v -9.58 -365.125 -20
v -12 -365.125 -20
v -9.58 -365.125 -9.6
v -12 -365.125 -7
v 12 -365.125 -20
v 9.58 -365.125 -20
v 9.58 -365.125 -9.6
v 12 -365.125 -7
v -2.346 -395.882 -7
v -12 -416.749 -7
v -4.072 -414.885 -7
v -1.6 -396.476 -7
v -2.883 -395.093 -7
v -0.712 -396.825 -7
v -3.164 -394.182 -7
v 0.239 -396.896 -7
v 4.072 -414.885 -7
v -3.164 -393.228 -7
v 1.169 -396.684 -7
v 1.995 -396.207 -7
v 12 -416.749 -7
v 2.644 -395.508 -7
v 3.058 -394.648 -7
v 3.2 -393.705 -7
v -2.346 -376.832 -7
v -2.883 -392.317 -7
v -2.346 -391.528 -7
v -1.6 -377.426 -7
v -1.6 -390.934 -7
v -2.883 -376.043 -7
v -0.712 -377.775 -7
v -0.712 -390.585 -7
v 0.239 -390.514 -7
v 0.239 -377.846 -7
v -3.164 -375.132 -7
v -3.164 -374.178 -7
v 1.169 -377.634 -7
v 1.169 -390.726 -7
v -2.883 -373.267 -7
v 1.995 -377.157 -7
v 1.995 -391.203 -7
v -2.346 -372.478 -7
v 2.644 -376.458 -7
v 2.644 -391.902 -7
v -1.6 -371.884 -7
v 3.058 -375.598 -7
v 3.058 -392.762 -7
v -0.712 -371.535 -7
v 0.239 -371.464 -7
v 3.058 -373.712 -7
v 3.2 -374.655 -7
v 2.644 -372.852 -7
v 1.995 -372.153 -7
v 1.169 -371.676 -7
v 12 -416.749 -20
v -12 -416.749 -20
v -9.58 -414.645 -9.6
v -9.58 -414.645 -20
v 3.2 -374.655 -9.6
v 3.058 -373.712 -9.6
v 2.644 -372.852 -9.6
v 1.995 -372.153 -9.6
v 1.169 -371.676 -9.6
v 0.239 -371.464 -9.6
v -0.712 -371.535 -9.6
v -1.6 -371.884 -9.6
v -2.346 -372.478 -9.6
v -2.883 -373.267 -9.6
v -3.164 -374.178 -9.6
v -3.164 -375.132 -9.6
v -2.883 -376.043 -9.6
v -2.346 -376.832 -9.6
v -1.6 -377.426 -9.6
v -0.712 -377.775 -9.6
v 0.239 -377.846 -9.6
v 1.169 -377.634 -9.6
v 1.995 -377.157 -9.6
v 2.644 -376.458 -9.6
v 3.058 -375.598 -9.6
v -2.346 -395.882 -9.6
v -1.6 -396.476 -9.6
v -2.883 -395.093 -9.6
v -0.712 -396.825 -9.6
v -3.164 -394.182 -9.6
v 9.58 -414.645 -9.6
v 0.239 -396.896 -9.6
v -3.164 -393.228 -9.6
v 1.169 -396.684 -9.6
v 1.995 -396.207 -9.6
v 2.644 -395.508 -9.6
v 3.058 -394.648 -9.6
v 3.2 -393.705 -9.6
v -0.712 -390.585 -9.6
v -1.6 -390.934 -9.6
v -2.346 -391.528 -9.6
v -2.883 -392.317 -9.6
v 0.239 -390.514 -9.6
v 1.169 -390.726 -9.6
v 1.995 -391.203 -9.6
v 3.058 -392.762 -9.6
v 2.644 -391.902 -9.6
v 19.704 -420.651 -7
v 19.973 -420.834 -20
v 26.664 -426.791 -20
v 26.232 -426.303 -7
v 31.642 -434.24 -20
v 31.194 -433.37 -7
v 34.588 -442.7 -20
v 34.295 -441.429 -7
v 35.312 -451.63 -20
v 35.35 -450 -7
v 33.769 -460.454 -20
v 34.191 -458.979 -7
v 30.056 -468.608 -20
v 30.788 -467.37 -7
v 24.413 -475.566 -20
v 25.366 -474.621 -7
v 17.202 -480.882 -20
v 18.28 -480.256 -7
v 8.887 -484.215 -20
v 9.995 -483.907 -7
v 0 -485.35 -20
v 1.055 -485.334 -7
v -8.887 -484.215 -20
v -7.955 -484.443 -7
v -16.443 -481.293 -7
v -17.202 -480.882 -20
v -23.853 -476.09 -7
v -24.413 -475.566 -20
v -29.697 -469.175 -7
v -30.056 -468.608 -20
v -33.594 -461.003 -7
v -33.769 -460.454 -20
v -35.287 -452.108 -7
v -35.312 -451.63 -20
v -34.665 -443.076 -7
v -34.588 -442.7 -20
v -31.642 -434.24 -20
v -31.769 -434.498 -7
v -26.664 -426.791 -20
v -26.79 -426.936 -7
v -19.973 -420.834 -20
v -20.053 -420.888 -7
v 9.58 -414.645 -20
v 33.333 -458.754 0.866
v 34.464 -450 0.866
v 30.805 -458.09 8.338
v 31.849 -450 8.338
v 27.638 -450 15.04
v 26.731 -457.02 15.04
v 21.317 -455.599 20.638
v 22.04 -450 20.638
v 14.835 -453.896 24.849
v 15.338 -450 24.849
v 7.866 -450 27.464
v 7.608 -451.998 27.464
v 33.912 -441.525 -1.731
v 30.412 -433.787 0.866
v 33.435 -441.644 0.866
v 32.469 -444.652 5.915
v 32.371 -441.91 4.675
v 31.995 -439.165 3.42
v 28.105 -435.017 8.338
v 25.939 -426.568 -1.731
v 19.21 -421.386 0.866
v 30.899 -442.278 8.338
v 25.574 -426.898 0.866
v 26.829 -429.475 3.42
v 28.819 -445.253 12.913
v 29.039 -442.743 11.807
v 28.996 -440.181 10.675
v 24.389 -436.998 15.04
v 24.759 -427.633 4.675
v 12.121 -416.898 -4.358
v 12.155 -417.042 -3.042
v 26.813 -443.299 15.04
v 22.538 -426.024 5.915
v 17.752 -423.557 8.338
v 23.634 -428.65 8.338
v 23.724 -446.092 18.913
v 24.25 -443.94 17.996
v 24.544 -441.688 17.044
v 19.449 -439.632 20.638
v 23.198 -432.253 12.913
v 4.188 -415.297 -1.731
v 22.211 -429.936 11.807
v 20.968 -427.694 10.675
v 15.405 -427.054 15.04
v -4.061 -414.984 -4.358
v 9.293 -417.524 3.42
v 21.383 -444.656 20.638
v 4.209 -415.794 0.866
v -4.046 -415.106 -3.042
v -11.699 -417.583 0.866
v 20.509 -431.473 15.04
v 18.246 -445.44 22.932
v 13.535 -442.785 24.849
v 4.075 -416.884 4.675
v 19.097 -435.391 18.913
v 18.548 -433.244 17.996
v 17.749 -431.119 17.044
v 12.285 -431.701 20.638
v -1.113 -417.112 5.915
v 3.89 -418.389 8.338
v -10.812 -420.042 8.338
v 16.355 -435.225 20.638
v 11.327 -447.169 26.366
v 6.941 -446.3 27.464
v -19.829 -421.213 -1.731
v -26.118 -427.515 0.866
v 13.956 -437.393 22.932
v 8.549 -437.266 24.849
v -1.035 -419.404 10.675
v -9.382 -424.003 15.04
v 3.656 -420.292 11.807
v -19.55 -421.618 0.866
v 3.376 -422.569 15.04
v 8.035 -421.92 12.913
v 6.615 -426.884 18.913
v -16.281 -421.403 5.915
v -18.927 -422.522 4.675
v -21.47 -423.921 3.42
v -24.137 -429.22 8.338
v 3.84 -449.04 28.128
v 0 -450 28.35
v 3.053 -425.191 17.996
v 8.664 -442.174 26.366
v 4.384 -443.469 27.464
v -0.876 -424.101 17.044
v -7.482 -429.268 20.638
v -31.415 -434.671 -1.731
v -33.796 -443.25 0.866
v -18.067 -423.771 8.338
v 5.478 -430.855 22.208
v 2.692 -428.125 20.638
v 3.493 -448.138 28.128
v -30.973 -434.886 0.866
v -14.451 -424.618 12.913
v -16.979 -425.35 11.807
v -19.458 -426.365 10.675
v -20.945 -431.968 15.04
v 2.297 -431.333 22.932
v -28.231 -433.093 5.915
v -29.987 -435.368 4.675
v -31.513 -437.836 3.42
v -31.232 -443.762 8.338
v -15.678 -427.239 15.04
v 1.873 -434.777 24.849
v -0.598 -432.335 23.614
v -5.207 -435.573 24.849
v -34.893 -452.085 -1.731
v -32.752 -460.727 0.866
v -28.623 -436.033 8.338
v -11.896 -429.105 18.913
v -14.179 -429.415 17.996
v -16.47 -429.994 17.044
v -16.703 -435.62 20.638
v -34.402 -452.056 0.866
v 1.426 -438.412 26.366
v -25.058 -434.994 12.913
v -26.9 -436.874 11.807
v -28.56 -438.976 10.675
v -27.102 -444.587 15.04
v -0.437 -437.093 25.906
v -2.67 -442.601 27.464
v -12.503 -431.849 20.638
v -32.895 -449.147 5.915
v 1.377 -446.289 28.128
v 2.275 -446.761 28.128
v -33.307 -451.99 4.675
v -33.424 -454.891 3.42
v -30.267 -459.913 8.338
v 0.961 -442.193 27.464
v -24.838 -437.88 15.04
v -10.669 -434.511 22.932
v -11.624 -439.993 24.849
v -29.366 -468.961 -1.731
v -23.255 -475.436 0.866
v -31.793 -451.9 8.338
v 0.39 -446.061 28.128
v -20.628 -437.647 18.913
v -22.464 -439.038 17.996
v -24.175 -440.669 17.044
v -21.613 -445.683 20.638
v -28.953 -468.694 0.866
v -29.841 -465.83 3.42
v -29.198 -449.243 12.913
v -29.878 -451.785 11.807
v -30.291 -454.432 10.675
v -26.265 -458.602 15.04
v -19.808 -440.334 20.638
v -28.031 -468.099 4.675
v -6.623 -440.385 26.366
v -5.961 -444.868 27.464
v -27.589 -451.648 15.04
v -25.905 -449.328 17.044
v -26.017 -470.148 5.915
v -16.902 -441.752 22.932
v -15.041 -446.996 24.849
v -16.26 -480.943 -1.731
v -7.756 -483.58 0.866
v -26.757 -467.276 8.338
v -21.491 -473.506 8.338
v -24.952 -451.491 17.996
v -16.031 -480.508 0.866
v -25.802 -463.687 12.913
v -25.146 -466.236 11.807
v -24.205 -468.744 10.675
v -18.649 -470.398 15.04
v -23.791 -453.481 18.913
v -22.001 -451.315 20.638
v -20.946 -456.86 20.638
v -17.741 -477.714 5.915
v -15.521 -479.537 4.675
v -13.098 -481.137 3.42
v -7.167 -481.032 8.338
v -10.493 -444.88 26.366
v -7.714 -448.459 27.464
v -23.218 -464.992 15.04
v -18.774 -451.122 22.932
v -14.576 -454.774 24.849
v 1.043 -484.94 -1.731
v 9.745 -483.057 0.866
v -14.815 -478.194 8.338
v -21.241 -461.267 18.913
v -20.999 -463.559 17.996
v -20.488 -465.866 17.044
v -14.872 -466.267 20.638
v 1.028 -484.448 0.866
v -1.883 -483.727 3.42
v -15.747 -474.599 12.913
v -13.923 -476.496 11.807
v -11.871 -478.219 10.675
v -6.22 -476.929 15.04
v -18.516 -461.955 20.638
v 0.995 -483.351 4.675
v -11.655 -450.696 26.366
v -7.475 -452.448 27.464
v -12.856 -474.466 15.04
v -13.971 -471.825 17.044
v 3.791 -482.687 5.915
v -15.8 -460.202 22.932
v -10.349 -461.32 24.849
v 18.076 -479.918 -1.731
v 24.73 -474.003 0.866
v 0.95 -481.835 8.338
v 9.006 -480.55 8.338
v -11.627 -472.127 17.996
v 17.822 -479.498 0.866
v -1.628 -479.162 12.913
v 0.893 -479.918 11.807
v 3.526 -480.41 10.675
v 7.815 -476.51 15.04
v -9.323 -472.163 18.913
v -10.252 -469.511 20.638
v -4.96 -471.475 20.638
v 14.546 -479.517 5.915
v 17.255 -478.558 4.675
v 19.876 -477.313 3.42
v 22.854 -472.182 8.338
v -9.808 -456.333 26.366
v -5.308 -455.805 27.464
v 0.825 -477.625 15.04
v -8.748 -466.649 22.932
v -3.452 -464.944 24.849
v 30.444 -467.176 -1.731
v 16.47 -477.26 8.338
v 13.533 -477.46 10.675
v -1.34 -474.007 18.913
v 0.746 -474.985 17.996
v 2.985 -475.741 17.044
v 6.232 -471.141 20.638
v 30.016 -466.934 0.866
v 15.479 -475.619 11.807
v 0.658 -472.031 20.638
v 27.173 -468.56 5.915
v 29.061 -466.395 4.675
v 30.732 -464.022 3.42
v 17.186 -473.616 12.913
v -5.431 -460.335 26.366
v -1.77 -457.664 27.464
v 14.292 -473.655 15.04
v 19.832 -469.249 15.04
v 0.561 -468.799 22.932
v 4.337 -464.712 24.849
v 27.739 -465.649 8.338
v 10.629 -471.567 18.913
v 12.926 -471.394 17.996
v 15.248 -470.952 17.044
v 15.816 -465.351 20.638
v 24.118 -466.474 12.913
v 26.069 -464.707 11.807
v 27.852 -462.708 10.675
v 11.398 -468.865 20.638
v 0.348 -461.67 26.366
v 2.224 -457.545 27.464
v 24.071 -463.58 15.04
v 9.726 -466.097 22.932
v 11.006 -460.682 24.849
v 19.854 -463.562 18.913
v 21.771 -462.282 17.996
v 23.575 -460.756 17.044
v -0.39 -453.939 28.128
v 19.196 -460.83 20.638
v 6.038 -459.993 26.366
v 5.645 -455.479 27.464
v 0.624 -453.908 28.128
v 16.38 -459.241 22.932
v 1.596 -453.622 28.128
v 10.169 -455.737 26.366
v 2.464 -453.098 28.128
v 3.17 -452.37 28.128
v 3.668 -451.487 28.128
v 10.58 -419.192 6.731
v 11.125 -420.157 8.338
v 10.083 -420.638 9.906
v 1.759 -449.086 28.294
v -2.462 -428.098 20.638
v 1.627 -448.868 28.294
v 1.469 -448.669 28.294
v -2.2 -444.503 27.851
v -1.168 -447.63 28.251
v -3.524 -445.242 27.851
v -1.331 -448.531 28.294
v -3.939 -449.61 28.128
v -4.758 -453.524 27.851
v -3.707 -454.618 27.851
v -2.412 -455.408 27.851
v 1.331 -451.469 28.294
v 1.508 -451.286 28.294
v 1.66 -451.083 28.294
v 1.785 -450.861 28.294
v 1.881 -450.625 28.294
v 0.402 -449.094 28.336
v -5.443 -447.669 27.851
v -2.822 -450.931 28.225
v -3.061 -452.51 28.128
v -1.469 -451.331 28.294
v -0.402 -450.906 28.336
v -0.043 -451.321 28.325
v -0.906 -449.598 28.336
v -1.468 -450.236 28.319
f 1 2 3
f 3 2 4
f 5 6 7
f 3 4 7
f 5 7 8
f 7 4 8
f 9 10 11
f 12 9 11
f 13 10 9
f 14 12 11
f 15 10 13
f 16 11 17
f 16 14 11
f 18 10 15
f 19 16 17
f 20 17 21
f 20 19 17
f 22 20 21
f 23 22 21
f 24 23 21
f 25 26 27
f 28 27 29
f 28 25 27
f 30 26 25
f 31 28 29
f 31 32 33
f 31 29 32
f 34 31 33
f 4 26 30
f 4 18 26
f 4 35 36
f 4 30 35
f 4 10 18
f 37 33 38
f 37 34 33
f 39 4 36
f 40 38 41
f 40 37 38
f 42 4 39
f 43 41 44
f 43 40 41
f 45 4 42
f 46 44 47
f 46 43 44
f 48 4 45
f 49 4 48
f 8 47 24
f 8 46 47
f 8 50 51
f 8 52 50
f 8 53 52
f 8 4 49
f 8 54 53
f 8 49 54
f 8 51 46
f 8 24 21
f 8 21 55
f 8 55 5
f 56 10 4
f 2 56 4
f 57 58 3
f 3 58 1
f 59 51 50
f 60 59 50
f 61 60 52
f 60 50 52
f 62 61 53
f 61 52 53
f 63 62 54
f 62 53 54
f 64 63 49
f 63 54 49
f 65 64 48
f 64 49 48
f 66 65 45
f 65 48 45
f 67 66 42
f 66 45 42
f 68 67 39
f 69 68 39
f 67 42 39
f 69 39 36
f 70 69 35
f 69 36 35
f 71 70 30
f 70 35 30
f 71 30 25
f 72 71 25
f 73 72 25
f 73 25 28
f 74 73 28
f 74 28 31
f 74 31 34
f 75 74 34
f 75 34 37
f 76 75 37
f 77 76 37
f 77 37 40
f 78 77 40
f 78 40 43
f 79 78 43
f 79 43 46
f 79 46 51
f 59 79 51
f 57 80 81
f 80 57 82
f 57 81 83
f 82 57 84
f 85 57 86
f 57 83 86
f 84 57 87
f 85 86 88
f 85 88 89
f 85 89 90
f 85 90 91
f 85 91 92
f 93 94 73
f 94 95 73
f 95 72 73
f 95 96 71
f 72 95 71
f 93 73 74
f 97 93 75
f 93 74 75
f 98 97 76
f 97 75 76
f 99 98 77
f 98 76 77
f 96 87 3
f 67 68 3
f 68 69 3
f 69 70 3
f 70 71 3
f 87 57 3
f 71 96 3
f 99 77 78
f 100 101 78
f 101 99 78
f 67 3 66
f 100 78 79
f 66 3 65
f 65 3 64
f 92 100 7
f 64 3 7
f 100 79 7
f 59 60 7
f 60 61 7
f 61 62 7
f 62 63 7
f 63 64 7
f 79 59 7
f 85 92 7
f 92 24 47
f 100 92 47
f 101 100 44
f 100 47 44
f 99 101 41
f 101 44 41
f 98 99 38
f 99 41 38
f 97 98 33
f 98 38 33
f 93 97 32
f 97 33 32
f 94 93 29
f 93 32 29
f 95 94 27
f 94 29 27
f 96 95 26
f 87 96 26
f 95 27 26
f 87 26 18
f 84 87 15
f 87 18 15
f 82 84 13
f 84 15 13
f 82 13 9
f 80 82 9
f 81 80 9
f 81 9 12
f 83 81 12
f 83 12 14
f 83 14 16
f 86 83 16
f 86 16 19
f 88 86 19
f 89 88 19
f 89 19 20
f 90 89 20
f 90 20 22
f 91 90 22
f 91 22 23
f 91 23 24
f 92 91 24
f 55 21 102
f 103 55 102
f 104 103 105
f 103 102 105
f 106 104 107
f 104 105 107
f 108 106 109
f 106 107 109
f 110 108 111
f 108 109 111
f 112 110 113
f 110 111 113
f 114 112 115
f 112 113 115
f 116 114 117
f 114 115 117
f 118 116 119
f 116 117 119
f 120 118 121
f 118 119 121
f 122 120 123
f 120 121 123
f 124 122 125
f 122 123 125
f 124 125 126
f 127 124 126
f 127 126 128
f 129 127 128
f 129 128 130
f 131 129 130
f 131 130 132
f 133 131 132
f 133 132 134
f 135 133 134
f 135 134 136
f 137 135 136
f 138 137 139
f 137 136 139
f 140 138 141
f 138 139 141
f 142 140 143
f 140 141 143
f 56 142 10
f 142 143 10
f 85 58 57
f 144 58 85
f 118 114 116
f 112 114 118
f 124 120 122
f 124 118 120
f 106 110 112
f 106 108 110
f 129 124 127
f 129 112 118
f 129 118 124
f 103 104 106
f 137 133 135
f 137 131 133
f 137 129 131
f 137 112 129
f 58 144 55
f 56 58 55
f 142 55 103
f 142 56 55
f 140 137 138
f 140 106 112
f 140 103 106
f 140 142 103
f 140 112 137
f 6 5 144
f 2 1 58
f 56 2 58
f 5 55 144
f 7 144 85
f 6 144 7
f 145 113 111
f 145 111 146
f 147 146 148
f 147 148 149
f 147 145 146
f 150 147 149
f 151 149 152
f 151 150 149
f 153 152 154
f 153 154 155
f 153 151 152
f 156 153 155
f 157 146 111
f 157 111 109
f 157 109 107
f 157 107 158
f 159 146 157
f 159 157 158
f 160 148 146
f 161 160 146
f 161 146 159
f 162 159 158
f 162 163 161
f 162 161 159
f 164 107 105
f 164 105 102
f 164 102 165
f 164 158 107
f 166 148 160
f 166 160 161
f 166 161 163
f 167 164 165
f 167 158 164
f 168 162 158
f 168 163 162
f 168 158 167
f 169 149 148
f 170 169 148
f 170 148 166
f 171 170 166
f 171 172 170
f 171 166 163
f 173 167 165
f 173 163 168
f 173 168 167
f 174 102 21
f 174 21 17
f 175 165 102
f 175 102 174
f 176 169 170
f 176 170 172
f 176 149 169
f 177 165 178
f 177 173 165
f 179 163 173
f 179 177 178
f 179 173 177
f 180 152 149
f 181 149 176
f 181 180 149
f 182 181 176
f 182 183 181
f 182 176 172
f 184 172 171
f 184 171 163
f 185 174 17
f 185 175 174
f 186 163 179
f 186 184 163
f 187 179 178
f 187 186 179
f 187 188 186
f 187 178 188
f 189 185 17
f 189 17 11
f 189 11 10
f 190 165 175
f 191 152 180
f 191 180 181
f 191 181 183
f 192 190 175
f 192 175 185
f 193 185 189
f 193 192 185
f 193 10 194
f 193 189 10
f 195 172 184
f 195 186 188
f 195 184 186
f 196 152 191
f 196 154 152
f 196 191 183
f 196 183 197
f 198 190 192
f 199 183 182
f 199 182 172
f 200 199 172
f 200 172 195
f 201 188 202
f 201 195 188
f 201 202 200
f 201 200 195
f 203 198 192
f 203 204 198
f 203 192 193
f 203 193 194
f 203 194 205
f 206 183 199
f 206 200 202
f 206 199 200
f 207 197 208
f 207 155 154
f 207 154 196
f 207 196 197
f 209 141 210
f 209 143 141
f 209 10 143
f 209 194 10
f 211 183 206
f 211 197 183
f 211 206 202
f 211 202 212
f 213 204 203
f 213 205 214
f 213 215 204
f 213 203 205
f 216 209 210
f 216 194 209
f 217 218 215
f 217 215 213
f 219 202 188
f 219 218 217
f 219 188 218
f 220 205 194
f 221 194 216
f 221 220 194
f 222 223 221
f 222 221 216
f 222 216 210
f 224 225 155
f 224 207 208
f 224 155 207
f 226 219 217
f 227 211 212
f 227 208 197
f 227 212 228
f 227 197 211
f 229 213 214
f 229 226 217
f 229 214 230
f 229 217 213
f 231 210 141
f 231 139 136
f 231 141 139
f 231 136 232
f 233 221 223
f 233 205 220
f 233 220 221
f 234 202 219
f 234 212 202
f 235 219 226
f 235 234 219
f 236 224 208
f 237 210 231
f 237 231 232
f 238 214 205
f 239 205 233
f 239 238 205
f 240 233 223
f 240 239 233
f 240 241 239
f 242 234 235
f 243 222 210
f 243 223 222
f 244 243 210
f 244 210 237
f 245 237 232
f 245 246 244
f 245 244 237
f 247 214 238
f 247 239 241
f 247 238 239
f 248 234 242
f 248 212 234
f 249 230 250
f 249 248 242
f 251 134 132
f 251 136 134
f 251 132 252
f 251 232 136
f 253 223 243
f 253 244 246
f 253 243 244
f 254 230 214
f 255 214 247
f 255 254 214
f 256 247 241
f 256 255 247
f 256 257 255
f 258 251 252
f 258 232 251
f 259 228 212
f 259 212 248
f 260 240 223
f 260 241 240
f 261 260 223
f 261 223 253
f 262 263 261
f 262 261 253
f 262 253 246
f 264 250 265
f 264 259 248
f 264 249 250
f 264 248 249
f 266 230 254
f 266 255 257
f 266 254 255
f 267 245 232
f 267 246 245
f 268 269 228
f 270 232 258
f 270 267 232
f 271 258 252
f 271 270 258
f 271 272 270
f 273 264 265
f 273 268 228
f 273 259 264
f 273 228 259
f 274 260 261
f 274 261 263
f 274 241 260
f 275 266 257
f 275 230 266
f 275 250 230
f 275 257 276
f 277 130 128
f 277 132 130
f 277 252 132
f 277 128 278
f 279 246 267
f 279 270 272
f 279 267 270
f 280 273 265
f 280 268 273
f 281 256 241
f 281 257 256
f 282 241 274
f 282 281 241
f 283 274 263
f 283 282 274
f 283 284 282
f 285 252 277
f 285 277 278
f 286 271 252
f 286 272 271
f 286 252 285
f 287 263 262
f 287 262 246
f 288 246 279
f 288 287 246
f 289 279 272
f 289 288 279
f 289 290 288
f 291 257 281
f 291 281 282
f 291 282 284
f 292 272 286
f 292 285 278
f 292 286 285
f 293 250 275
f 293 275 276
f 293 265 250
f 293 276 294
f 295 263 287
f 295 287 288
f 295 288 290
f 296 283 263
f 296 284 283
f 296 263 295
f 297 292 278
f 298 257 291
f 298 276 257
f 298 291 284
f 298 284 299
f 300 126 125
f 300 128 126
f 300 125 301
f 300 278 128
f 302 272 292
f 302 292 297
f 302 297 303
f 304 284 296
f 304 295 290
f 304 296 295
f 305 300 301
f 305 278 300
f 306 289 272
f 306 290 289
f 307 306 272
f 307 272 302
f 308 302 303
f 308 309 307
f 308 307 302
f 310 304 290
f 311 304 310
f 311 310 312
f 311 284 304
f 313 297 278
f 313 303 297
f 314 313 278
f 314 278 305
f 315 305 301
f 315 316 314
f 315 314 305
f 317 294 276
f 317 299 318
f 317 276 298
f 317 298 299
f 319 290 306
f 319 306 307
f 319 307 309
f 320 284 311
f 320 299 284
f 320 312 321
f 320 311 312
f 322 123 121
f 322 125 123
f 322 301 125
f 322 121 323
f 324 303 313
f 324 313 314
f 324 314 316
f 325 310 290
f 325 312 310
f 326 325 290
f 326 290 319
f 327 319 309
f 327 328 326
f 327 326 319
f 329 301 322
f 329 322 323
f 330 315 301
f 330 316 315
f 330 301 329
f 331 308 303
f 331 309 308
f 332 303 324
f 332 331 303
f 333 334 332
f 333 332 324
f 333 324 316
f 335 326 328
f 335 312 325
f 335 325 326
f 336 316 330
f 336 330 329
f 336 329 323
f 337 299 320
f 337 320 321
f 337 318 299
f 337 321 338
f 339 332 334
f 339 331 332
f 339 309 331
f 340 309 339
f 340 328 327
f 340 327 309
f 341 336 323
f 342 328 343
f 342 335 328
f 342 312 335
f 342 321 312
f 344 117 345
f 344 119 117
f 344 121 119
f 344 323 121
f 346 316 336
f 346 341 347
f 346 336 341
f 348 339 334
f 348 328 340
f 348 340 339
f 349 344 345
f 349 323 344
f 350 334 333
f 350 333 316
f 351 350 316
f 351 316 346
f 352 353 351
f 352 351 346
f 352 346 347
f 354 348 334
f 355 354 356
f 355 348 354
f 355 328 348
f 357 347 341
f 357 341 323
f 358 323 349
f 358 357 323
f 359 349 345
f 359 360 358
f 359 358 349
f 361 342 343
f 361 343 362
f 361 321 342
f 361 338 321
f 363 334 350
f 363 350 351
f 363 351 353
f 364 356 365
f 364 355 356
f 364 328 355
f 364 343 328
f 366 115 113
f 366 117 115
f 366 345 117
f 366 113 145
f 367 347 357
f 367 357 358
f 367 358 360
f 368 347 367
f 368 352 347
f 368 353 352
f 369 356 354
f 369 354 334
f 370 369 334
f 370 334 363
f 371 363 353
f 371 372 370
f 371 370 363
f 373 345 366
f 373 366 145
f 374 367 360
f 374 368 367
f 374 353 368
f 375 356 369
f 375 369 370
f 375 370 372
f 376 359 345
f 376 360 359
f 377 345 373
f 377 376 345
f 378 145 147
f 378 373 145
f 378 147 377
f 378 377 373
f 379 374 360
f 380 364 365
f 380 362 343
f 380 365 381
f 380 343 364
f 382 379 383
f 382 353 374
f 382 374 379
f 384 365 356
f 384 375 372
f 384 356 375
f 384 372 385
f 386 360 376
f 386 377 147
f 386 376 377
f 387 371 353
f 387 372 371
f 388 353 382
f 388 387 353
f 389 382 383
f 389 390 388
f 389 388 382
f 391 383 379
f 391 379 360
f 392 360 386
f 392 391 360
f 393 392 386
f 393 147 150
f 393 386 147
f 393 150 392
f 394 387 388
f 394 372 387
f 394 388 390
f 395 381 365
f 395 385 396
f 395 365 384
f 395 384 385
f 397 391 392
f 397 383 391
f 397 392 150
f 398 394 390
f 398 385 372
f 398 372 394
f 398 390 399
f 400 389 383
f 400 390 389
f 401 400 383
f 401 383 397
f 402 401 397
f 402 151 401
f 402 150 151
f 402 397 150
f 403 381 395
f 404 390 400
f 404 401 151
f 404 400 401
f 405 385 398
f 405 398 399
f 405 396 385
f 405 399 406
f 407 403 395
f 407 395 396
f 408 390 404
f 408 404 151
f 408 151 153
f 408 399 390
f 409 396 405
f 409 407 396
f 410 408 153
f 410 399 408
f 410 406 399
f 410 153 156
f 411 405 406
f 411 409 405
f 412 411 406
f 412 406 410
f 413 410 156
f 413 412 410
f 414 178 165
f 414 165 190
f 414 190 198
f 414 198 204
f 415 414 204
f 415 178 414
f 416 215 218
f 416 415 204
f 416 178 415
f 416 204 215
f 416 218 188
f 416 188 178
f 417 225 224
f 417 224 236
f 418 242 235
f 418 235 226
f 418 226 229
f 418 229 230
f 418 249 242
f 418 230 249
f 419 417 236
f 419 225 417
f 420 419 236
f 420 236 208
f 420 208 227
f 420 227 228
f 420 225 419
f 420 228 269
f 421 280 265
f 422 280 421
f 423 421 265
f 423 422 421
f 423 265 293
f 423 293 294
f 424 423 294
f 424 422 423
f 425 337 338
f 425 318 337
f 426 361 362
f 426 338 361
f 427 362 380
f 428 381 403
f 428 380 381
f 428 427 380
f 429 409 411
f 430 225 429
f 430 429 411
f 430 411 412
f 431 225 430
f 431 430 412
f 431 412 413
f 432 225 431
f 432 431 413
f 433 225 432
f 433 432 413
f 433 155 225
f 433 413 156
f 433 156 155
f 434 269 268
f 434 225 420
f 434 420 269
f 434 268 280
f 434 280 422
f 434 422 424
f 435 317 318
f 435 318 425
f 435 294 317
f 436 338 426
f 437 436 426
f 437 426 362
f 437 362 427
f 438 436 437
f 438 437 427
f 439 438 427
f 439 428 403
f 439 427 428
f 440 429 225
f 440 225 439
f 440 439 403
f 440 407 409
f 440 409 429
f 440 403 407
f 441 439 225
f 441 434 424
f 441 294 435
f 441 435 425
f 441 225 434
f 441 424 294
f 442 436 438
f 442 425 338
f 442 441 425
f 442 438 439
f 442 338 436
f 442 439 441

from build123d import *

# Parameters (mm, degrees)
SKETCH001_W       = 19.16
SKETCH001_H       = 49.52
EXTRUDE001_DEPTH  = 10.4
SKETCH138_W       = 24
SKETCH138_H       = 84.875
SKETCH138_R       = 3.2
EXTRUDE042_DEPTH  = 13
CYLINDER168_R     = 35.35
CYLINDER168_DEPTH = 13


with BuildPart() as extrude001:
    # Sketch001 → Extrude001 (new body)
    with BuildSketch(Plane.XY.offset(-13)):
        with Locations((0, 60.115)):
            Rectangle(SKETCH001_W, SKETCH001_H)
    extrude(amount=EXTRUDE001_DEPTH)


with BuildPart() as extrude042:
    # Sketch138 → Extrude042 (new body)
    with BuildSketch(Plane.XY):
        with Locations((0, 42.4375)):
            Rectangle(SKETCH138_W, SKETCH138_H)
        with Locations((0, 56.295)):
            Circle(SKETCH138_R, mode=Mode.SUBTRACT)
        with Locations((0, 75.345)):
            Circle(SKETCH138_R, mode=Mode.SUBTRACT)
    extrude(amount=-EXTRUDE042_DEPTH)


with BuildPart() as cylinder168:
    # Cylinder168 → Cylinder168 (new body)
    with BuildSketch(Plane(origin=(0, 0, 0), x_dir=(-1, 0, 0), z_dir=(0, 0, -1))):
        Circle(CYLINDER168_R)
    extrude(amount=CYLINDER168_DEPTH)


with BuildPart() as rg15:
    # Sphere → Sphere (revolve)
    with BuildSketch(Plane.XZ):
        with BuildLine():
            ThreePointArc((35.35, 0), (24.996225, 24.996225), (0, 35.35))
            Line((0, 35.35), (0, 0))
            Line((0, 0), (35.35, 0))
        make_face()
    revolve(axis=Axis((0, 0, 0), (0, 0, 1)))

    # Fusion107: union Extrude042, Cylinder168
    add(extrude042.part)
    add(cylinder168.part)

    # Cut057: cut Extrude001
    add(extrude001.part, mode=Mode.SUBTRACT)


with BuildPart() as rg15_1:
    # Cut057 placement: moved
    add(rg15.part.moved(Location((0, -450, -7))))


solid = rg15_1.part
